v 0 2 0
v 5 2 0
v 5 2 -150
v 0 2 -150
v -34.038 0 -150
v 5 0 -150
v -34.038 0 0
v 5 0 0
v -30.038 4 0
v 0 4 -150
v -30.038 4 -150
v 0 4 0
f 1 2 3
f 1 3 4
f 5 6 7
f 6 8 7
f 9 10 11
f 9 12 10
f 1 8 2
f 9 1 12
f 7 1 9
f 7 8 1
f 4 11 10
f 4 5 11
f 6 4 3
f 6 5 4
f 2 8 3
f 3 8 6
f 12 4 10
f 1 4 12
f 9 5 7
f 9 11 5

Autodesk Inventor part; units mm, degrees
ref_plane "YZ Plane" through (0, 0, 0) normal (1, 0, 0) x (0, 1, 0)
ref_plane "XZ Plane" through (0, 0, 0) normal (0, 1, 0) x (-1, 0, 0)
ref_plane "XY Plane" through (0, 0, 0) normal (0, 0, 1) x (1, 0, 0)
sketch "Sketch1" plane through (0, 0, 0) normal (0, 1, 0) x (-1, 0, 0)
  line L0 (0, 0) -> (34.038, 0)
  line L1 (34.038, 0) -> (34.038, -150)
  line L2 (34.038, -150) -> (0, -150)
  line L3 (0, -150) -> (0, 0)
  line L4 (0, 0) -> (-5, 0)
  line L5 (-5, 0) -> (-5, -150)
  line L6 (-5, -150) -> (0, -150)
  dimension "d0" = 34.038
  dimension "d1" = 150
  dimension "d2" = 5
extrude "Extrusion1" add sketch "Sketch1" along normal blind 4 contours L0 L1 L2 L3
extrude "Extrusion2" add sketch "Sketch1" along normal blind 2 contours L3 L6 L5 L4
chamfer "Chamfer1" distance 4 angle 45 1 edges at (-34.038, 4, -75)
properties part number "frontWallipt"
